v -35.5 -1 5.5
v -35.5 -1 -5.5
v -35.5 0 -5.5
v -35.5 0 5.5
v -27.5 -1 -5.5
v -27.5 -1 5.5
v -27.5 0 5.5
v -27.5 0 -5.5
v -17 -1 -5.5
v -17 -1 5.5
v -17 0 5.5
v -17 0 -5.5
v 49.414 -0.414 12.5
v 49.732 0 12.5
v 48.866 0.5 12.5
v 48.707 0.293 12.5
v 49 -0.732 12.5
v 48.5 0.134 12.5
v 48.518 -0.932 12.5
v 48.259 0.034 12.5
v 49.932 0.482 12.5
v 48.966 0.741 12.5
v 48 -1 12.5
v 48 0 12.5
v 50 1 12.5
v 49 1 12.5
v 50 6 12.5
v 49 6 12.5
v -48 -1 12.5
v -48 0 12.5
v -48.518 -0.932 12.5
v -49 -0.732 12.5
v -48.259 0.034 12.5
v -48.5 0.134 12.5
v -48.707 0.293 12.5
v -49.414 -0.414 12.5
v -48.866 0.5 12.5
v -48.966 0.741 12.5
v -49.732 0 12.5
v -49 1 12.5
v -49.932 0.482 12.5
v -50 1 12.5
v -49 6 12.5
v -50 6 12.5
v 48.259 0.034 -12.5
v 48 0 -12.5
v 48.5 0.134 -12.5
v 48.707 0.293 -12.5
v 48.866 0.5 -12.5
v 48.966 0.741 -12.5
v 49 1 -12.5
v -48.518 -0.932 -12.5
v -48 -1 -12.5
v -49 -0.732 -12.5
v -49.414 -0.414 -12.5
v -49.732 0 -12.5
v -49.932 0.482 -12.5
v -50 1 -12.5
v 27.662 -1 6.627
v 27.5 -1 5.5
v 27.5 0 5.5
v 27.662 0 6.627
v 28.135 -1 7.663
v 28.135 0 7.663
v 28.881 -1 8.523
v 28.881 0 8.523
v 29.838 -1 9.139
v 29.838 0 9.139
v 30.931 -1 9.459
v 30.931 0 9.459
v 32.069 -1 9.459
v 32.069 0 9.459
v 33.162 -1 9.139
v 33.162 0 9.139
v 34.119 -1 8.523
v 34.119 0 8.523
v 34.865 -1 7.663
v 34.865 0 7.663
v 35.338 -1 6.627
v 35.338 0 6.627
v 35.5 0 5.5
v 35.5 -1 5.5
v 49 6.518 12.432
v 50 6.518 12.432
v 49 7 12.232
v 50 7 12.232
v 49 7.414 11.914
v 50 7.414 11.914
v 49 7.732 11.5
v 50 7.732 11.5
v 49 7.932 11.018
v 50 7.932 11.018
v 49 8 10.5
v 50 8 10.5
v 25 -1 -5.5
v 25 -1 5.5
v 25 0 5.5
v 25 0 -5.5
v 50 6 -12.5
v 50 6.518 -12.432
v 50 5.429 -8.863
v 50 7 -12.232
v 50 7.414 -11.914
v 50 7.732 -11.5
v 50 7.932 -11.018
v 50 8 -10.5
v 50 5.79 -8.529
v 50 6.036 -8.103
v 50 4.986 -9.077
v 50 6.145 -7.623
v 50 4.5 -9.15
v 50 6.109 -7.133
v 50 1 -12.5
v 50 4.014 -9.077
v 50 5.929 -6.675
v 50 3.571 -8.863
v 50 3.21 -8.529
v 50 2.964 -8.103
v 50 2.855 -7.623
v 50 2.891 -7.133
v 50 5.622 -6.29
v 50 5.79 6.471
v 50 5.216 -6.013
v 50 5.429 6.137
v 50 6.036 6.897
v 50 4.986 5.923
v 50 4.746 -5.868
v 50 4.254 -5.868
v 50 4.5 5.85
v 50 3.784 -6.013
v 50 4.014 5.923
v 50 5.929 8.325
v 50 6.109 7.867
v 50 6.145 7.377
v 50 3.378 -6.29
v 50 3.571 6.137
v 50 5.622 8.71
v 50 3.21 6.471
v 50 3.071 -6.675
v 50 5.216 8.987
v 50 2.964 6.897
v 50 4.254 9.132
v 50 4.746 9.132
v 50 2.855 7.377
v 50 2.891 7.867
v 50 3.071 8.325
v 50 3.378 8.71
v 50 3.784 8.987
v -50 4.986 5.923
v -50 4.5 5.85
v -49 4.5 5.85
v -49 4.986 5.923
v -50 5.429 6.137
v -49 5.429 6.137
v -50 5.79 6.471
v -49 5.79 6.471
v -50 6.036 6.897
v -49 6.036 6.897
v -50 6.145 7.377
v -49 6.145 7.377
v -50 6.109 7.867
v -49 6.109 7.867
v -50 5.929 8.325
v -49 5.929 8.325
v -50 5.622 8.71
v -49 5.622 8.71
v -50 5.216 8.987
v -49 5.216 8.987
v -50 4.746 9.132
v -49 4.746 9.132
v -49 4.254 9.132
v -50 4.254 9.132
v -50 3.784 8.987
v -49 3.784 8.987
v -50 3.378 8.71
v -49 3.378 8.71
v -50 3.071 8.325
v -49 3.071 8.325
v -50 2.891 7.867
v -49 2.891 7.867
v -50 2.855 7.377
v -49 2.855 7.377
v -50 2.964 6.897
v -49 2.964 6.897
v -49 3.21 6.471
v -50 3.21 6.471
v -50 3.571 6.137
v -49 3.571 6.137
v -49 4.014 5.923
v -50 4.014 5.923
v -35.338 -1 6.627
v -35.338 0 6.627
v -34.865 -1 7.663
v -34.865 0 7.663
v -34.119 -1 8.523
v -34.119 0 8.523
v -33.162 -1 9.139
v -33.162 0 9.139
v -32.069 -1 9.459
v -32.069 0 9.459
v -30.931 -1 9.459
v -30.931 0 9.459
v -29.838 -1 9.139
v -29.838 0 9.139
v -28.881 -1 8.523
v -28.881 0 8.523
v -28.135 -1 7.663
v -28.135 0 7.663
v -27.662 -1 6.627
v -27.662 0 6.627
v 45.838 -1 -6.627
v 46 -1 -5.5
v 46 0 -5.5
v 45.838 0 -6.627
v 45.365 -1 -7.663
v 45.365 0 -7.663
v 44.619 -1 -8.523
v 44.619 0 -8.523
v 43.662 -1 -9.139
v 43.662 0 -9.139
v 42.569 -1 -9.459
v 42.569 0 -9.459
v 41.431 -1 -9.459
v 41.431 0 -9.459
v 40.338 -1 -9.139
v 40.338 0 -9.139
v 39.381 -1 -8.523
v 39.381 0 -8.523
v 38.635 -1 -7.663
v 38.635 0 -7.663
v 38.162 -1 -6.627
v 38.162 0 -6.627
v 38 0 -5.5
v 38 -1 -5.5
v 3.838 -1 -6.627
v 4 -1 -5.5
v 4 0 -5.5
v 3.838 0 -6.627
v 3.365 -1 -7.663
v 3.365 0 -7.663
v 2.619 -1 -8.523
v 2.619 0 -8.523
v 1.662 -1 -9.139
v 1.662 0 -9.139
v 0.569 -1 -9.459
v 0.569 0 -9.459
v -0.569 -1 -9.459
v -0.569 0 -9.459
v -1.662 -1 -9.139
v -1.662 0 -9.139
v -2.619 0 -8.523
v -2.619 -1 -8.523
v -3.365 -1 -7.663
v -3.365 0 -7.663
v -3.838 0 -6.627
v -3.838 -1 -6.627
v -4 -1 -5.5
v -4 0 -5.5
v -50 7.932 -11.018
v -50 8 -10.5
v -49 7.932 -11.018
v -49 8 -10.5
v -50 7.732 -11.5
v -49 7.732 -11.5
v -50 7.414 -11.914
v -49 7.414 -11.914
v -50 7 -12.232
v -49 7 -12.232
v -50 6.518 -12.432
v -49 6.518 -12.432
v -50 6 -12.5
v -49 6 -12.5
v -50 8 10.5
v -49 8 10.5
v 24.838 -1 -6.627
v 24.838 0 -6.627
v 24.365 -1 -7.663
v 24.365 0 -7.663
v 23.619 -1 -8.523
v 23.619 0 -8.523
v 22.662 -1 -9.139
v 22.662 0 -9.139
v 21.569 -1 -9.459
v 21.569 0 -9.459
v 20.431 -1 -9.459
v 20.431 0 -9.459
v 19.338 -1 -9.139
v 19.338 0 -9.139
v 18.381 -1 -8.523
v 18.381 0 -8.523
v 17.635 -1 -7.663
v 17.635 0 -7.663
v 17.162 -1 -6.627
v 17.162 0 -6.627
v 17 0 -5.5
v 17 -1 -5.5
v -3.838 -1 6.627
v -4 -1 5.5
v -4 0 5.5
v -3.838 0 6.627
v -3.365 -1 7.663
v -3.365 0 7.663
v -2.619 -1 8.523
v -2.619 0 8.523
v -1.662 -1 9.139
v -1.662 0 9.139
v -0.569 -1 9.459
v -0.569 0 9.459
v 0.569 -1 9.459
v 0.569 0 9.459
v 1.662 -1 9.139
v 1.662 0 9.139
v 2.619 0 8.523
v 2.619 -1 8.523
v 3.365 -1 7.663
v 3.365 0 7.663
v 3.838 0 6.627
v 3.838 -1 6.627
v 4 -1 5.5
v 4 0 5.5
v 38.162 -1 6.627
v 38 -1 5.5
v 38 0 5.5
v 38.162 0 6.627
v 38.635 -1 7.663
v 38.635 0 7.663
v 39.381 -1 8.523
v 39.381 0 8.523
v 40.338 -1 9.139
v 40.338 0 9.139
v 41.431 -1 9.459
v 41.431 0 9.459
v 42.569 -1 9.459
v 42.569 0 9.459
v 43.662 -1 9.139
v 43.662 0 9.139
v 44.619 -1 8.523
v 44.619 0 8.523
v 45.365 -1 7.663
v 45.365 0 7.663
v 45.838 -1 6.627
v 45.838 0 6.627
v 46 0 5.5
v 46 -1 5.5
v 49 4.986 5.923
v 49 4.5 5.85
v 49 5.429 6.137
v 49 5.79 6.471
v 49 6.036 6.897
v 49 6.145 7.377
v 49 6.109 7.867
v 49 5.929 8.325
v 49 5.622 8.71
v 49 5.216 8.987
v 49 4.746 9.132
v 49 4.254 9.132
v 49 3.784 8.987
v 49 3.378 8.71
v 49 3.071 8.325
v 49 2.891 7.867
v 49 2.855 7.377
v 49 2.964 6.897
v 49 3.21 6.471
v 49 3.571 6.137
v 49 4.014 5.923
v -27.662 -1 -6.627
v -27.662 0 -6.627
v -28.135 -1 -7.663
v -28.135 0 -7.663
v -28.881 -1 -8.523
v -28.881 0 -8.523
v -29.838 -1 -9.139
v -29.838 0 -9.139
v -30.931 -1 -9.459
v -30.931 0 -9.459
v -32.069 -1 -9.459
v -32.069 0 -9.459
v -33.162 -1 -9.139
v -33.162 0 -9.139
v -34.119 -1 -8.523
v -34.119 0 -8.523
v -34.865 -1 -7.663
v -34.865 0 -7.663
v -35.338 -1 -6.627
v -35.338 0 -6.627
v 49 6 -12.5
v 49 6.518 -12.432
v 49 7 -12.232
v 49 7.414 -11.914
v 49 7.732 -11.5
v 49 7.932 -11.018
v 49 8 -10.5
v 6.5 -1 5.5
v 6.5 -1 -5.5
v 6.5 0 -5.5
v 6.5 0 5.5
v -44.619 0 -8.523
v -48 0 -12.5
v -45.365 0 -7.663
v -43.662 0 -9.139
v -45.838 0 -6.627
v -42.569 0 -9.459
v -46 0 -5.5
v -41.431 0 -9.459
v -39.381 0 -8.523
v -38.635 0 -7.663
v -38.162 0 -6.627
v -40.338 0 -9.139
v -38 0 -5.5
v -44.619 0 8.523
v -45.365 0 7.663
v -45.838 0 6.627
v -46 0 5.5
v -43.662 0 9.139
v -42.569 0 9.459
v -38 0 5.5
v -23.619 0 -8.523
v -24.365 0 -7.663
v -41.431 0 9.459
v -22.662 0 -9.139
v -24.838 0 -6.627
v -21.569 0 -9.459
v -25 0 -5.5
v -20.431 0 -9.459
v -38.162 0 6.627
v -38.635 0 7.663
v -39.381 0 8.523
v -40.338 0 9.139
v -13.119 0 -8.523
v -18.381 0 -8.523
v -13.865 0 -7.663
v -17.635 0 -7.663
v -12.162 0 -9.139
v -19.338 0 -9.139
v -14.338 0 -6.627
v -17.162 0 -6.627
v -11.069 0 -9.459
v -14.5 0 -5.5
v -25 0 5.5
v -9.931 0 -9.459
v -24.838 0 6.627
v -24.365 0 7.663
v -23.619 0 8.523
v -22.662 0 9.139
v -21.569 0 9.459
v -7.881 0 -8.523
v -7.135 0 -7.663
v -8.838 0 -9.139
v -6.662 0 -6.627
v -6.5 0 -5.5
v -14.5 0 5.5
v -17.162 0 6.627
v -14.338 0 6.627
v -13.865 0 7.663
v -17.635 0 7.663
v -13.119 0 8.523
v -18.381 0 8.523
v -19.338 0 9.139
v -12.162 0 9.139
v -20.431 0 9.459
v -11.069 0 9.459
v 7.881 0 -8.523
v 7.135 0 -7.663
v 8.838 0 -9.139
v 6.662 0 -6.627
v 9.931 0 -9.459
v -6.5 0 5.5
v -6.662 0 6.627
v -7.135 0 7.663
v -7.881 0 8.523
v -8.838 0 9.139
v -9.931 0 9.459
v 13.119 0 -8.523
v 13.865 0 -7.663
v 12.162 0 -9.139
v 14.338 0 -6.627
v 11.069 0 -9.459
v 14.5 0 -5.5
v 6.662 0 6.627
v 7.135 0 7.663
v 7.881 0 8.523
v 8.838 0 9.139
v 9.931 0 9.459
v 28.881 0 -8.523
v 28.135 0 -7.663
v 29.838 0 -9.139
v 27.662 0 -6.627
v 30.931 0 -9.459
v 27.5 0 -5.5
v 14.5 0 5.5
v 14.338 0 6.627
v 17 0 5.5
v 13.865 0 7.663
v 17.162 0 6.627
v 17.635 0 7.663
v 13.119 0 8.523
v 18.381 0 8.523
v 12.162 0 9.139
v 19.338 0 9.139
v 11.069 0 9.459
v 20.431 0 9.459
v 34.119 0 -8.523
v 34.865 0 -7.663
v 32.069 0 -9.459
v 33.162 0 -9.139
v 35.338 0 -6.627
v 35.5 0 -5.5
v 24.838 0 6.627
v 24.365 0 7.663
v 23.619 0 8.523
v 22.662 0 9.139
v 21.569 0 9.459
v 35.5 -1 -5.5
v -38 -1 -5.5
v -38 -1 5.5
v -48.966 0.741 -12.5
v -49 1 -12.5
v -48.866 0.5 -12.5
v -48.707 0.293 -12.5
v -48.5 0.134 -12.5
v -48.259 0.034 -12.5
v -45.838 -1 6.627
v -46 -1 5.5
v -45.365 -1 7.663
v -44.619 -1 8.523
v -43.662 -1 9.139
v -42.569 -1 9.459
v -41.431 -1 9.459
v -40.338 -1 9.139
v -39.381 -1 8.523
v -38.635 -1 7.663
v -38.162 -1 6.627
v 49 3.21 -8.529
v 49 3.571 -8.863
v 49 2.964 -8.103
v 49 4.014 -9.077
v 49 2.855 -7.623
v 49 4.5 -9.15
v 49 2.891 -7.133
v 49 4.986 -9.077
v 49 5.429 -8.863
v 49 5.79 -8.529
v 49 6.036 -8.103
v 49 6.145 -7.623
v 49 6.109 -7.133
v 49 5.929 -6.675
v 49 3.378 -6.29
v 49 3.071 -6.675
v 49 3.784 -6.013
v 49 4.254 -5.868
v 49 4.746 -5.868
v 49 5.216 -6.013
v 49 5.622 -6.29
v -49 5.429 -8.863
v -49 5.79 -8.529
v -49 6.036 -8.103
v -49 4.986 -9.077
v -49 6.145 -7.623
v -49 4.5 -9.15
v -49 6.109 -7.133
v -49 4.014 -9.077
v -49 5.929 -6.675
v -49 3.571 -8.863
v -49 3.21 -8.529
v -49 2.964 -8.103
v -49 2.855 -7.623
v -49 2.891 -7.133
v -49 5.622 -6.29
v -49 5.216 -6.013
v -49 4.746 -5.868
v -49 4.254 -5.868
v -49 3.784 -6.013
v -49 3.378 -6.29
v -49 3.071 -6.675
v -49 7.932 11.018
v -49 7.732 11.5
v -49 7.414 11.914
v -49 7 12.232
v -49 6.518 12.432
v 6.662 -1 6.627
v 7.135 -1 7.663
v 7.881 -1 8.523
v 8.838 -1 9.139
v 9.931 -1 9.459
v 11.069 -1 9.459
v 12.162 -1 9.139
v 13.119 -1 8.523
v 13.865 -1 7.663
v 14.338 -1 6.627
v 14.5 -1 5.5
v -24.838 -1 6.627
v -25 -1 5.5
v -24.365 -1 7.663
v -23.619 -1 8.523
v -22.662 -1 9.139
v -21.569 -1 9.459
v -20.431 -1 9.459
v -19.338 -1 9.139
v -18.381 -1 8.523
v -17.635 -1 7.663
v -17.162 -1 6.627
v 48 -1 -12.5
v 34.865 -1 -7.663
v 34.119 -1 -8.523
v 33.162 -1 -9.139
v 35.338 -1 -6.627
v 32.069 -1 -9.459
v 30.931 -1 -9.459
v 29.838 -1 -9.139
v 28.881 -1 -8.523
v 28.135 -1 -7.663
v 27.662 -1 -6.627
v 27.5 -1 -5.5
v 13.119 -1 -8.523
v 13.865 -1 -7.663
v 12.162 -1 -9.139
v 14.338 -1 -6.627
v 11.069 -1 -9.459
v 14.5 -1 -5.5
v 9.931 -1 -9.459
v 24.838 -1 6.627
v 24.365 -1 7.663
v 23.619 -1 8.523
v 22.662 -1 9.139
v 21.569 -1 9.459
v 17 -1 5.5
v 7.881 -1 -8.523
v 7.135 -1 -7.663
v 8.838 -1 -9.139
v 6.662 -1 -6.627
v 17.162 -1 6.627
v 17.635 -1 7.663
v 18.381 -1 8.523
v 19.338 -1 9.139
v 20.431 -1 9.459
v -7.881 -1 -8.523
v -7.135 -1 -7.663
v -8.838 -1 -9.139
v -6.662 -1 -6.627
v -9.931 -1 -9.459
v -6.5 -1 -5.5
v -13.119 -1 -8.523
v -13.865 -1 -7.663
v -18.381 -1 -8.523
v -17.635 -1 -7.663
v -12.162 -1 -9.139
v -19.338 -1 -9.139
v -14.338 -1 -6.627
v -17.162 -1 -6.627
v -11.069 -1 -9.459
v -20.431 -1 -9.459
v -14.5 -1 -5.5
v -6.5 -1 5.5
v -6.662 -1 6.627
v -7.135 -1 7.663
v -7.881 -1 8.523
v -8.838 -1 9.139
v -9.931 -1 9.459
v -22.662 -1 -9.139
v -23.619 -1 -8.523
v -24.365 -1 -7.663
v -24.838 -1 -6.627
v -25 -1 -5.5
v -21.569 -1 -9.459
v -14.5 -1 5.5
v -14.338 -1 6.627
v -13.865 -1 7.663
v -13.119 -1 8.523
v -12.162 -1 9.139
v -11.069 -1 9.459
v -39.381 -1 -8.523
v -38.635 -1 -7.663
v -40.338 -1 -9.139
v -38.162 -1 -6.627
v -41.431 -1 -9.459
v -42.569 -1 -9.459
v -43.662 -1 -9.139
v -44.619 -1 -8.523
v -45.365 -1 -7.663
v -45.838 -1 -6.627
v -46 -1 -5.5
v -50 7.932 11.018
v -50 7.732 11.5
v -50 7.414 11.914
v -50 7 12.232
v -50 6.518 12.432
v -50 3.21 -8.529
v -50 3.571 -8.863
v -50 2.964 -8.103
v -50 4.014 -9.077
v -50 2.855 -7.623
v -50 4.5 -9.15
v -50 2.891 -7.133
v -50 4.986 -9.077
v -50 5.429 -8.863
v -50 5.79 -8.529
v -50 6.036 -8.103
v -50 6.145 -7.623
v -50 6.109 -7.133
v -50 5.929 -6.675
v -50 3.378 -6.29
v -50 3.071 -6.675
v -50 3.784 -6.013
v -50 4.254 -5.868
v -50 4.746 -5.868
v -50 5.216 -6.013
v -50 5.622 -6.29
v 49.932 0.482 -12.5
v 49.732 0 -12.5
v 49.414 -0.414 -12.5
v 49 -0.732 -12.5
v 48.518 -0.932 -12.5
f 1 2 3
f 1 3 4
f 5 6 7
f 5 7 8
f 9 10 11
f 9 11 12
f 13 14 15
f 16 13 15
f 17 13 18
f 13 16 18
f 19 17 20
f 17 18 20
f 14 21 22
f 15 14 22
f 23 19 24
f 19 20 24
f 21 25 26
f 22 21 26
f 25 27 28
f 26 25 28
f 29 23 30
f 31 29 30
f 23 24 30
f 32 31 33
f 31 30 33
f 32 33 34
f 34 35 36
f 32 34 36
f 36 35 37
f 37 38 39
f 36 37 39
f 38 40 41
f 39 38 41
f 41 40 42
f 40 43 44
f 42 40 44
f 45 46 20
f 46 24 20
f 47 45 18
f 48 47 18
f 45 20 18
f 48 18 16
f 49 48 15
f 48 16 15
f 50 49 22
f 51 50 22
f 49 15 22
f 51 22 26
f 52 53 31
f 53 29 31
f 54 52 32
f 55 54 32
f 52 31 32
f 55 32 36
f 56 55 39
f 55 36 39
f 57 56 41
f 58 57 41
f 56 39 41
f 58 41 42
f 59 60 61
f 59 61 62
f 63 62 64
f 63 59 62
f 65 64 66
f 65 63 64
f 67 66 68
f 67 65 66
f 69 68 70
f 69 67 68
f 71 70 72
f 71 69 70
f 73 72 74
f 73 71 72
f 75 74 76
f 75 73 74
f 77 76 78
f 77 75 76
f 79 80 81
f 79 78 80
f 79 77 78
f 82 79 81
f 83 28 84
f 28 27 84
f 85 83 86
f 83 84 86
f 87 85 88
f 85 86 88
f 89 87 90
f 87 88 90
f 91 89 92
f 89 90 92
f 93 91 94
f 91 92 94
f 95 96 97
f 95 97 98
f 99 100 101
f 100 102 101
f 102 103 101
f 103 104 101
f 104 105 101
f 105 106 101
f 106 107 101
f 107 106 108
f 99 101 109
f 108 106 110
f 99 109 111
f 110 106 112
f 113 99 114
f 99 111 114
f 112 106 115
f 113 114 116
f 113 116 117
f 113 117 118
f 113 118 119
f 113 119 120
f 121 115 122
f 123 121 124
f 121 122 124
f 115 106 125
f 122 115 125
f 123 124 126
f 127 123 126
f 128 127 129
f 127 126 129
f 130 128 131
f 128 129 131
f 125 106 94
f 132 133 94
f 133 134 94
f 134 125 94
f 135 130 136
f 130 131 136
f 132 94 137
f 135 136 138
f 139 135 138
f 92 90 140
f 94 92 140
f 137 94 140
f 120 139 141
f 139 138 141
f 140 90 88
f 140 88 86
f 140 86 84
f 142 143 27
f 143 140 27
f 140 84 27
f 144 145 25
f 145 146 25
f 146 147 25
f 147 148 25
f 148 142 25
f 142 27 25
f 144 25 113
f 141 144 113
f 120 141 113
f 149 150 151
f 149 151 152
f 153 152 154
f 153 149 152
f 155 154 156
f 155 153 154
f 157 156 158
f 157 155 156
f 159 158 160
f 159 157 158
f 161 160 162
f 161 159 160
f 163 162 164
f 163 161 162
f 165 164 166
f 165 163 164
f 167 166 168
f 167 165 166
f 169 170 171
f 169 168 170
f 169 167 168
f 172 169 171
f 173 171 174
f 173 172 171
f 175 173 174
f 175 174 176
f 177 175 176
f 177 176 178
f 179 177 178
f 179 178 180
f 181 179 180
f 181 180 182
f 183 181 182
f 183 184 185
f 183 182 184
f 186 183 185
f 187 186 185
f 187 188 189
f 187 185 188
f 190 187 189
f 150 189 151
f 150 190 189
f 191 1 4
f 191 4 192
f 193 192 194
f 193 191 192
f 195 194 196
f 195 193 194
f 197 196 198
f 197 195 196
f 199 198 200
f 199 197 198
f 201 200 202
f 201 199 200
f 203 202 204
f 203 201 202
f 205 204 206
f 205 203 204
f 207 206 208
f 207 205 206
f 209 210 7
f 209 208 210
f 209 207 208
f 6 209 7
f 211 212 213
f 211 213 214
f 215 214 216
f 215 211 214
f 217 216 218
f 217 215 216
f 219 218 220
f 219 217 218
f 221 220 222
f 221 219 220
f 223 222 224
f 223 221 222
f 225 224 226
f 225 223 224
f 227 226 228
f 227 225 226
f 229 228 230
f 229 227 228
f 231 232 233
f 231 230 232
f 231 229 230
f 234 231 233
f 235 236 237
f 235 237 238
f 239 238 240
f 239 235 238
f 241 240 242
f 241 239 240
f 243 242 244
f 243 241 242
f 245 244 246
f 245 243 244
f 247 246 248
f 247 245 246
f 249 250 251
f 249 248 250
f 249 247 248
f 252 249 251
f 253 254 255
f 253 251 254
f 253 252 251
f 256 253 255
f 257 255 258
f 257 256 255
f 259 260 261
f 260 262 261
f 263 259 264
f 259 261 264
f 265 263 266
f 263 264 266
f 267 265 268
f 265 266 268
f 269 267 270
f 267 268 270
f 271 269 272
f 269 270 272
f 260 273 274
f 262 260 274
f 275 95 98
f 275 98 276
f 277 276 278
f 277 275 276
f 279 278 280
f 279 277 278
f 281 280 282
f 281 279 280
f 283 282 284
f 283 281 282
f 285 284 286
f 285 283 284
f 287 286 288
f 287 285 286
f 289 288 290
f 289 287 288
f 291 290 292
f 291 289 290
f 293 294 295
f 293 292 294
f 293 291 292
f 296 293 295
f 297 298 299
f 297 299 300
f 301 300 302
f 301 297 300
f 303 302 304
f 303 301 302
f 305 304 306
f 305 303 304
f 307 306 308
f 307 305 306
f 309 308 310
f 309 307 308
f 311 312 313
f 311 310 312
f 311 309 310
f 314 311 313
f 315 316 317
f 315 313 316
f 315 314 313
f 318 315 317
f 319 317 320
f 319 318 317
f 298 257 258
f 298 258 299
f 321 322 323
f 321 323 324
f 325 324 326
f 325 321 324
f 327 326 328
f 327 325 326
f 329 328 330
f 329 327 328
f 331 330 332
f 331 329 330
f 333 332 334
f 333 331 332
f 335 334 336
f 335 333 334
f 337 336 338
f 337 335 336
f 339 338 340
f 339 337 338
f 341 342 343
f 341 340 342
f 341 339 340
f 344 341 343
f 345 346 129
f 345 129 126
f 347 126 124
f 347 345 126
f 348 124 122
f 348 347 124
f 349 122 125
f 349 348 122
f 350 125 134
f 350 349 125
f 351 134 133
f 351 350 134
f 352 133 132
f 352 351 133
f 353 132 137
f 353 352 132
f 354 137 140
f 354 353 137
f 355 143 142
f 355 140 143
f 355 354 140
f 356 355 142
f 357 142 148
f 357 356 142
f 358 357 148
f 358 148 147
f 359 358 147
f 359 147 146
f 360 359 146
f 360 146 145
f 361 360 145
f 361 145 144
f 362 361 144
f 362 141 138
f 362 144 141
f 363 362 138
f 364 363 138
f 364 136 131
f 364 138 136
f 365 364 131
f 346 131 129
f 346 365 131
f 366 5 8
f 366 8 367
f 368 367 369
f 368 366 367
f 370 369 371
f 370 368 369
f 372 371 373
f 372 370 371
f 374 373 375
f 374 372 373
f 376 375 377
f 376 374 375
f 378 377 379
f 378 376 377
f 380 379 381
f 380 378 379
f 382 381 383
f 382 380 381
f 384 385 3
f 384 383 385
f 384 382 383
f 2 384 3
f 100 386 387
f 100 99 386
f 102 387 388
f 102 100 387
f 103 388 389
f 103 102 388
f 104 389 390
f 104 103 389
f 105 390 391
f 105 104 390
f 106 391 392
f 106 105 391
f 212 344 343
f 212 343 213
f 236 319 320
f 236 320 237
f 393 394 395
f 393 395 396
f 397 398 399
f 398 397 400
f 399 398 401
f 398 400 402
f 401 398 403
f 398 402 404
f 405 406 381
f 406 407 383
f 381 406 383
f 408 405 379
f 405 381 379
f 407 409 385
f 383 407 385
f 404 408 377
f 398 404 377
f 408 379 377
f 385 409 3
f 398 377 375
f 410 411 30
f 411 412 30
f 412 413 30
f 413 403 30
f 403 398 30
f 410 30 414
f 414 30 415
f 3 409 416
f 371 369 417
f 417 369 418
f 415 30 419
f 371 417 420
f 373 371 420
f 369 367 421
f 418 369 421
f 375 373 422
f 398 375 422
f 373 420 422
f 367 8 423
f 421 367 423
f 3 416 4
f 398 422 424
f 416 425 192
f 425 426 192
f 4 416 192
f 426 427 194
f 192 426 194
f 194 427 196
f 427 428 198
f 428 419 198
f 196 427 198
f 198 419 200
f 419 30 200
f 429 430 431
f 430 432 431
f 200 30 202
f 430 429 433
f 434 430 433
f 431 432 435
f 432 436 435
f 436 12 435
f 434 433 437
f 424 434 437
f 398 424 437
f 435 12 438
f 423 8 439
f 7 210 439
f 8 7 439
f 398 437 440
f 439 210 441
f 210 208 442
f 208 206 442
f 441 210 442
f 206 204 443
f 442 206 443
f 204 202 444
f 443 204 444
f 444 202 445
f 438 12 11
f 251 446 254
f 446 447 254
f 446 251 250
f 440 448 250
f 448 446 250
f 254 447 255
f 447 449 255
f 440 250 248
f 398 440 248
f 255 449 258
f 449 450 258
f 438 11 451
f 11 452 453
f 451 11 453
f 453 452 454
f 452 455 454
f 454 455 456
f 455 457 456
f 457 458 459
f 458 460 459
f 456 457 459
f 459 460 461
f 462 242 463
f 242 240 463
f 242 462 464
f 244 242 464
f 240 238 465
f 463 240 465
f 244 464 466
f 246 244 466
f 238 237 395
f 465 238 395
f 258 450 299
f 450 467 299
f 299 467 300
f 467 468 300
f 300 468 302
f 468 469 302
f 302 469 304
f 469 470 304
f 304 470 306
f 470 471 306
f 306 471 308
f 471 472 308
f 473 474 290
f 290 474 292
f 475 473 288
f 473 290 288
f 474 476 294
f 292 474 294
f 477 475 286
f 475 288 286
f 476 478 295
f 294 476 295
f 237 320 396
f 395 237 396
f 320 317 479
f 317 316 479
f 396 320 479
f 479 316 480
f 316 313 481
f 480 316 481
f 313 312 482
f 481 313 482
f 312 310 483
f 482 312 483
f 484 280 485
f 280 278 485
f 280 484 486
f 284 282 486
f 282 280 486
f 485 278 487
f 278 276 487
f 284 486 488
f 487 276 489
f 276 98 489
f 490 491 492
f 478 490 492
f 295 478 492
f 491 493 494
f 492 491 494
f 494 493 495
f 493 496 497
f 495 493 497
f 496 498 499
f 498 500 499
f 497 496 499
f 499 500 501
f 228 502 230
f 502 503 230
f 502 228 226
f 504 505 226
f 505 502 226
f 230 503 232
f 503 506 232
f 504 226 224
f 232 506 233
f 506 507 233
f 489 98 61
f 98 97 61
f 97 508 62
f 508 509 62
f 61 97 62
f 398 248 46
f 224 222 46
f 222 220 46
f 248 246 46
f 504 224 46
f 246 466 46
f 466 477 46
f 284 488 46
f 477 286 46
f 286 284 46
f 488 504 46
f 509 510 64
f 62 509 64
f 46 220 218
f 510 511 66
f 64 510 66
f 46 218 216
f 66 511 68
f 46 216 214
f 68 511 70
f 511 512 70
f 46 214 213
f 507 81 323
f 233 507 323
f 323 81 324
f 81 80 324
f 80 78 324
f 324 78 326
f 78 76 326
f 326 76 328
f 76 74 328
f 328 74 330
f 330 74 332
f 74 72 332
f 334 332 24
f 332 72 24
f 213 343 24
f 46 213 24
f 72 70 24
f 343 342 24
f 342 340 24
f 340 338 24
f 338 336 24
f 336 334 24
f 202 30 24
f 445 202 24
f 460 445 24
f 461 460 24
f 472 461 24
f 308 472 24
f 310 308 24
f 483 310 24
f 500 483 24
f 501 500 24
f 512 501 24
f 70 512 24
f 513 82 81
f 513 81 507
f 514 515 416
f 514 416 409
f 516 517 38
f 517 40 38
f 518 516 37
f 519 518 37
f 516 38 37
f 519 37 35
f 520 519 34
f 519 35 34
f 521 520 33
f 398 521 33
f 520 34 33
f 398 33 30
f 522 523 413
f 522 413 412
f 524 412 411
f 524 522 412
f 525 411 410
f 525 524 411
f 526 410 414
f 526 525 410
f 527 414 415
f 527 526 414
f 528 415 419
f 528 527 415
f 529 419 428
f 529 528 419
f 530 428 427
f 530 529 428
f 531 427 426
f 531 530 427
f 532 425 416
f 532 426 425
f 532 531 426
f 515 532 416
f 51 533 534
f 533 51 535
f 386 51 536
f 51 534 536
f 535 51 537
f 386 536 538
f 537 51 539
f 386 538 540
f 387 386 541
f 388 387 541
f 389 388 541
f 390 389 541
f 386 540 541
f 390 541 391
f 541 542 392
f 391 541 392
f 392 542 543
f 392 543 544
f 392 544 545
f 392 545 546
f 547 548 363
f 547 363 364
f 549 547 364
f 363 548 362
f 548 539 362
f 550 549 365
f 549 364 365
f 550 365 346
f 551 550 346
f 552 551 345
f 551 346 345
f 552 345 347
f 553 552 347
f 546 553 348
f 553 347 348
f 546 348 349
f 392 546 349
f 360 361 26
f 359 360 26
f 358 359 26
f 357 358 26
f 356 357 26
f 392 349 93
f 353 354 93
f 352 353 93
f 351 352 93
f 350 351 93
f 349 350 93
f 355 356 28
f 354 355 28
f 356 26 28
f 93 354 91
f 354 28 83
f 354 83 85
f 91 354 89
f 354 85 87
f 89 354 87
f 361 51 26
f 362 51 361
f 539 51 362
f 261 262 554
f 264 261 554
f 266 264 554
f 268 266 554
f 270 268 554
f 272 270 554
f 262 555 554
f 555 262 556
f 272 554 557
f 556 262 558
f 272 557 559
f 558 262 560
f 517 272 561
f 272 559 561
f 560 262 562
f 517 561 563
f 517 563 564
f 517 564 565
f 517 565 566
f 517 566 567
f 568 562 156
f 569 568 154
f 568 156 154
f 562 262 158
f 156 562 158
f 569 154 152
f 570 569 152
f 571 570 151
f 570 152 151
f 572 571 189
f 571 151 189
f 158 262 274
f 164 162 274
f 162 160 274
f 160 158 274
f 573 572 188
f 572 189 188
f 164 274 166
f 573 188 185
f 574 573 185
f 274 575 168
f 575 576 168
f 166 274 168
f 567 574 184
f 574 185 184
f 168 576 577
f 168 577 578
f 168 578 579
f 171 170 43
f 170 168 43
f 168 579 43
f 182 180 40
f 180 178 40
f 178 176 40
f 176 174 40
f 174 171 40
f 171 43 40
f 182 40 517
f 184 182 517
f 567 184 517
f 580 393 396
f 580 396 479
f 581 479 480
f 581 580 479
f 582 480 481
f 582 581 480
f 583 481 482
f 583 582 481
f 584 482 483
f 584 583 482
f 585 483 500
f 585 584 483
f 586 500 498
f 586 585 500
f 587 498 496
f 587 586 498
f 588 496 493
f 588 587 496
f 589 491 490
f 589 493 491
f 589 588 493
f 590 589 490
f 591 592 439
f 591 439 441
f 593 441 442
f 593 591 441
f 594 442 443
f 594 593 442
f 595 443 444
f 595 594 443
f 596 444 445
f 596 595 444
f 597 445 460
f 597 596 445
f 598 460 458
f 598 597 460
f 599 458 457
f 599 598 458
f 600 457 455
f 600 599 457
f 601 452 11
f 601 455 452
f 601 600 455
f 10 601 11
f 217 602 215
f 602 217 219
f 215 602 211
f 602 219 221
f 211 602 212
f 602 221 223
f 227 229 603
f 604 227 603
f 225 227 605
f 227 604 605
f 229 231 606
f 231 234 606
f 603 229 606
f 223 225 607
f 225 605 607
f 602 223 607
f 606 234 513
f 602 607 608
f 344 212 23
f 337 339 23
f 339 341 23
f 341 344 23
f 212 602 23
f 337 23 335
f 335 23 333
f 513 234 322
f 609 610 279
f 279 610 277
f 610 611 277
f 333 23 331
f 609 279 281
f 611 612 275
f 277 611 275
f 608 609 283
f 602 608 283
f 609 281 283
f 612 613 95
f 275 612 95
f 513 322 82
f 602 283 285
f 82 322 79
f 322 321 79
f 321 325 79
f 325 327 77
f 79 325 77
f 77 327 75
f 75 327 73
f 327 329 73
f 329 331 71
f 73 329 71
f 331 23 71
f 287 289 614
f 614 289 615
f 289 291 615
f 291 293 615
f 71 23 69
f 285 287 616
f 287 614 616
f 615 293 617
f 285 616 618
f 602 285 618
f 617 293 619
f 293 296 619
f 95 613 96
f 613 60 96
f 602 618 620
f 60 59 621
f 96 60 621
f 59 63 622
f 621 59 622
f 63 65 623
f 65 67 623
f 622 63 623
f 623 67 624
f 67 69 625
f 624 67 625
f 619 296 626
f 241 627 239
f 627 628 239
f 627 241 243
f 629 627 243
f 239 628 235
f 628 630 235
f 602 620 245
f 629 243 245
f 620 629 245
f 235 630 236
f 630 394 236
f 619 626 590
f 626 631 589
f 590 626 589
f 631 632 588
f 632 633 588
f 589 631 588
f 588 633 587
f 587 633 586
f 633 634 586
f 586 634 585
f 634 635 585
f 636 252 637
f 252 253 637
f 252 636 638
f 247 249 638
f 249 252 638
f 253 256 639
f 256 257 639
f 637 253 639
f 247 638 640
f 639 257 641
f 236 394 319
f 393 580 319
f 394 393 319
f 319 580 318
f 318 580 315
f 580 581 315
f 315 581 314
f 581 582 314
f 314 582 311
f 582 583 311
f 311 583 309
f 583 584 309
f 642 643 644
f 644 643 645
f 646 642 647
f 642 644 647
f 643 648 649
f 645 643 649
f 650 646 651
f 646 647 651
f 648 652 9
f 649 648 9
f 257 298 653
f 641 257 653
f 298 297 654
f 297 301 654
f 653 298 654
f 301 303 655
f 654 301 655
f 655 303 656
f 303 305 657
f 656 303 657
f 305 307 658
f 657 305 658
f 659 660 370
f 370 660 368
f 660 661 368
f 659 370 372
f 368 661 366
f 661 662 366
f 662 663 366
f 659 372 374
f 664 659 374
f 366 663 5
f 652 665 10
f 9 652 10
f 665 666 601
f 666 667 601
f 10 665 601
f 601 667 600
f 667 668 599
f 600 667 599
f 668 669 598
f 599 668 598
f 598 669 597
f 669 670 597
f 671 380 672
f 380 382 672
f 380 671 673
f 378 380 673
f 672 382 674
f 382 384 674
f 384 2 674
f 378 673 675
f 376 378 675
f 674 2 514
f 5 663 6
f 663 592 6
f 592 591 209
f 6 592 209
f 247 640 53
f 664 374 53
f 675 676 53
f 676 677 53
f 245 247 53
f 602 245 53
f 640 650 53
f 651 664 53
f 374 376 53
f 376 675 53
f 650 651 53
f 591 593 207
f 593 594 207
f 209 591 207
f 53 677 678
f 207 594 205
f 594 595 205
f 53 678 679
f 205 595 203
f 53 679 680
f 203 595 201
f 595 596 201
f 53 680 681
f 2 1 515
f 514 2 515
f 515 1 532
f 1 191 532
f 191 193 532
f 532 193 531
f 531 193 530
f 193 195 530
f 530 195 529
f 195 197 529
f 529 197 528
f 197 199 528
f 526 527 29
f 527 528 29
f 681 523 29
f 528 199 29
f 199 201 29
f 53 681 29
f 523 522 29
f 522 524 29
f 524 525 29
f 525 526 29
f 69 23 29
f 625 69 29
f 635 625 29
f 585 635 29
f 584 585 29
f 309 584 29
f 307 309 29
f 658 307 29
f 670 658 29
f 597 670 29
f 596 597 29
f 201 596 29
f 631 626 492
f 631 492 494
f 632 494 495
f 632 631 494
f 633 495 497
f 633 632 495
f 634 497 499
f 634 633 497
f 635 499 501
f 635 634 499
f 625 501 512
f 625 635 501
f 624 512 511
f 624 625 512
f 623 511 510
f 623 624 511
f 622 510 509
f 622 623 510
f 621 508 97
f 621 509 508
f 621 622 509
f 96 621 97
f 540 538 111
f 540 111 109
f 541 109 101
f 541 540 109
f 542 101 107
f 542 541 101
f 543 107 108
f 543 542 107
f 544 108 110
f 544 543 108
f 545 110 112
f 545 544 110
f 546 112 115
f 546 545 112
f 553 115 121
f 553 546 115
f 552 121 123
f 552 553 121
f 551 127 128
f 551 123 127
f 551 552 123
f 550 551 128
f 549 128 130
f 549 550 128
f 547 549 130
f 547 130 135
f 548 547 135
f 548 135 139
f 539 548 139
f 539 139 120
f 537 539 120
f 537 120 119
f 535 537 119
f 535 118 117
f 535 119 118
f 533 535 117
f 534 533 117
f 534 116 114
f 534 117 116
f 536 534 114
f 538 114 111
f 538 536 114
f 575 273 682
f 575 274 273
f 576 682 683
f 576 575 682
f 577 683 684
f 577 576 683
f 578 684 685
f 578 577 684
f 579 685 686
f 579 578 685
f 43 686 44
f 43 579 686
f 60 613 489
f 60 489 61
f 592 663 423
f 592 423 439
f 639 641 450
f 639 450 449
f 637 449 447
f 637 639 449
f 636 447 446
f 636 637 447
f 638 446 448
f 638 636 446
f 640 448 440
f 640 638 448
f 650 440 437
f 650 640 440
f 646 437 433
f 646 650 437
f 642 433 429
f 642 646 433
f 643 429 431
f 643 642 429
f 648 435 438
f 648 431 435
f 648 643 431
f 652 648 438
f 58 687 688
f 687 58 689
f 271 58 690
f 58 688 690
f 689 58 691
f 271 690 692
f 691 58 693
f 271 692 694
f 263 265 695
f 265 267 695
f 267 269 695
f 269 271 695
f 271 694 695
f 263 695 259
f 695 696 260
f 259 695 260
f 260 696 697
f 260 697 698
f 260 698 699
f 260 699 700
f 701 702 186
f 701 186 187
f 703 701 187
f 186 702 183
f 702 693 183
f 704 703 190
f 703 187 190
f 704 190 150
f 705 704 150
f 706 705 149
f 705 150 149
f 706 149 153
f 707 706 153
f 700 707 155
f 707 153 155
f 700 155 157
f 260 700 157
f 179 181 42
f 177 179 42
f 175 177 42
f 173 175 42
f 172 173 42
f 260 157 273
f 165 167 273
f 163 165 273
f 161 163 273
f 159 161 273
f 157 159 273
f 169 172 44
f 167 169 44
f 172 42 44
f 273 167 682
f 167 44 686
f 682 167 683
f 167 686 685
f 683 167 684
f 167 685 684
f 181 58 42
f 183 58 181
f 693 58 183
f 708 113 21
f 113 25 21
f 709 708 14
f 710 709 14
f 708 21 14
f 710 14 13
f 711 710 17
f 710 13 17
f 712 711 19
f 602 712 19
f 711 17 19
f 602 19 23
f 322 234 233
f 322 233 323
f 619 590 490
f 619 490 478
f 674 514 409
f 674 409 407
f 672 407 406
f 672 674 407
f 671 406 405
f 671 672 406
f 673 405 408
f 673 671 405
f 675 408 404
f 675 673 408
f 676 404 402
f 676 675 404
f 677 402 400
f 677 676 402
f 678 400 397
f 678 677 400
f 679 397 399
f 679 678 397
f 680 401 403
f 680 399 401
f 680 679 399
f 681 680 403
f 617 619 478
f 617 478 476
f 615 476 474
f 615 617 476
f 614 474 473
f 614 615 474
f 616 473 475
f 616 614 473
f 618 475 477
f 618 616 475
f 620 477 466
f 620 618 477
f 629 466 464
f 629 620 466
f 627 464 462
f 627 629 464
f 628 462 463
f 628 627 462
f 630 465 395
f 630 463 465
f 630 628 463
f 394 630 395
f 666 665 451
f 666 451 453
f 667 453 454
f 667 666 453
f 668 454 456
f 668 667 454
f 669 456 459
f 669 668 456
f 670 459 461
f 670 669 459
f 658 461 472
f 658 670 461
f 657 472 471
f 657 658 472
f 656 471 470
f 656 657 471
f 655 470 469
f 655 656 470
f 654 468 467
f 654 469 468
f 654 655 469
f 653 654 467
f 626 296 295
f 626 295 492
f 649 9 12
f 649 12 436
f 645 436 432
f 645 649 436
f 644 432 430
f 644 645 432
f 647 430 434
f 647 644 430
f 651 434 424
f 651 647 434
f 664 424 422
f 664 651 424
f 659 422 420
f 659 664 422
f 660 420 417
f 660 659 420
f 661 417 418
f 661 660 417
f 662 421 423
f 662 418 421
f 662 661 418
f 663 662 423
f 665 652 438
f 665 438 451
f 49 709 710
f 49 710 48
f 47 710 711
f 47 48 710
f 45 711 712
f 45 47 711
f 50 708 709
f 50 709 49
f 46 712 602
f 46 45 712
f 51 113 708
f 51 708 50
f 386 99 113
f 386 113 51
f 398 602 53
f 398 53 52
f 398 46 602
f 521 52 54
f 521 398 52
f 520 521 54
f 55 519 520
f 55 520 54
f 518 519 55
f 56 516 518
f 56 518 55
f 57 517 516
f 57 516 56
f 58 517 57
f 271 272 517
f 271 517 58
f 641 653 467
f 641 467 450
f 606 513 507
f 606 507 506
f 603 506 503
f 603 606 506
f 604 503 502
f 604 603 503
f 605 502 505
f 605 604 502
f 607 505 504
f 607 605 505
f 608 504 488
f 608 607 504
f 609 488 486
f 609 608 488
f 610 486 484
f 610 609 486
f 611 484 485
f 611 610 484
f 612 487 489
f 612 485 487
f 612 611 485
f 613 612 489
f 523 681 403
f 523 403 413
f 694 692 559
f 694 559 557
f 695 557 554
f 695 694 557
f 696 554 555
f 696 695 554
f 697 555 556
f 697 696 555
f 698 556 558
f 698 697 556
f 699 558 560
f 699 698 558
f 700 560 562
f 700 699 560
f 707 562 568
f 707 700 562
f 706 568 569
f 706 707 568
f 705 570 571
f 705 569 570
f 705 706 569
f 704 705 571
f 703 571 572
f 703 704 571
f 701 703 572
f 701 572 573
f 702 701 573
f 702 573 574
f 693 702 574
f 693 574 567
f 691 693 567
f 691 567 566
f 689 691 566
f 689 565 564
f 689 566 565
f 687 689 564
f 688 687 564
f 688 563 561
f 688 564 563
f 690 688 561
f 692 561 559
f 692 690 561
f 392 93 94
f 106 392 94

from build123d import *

# Parameters (mm, degrees)
SM_BASE_FLANGE_1_DEPTH   = 12.5
CUT_EXTRUDE_1_DEPTH      = 53.156015952
CUT_EXTRUDE_1_DEPTH_BACK = 53.156015952
SKETCH_6_R               = 1.65
CUT_EXTRUDE_2_DEPTH      = 10
FILLET_1_R               = 2


# Sheet-metal steps are written as plain solids
with BuildPart() as part:
    # Sketch 1 → 基体-法兰1 (new, symmetric)
    with BuildSketch(Plane.XY):
        with BuildLine():
            Line((-49, 8), (-49, 1))
            ThreePointArc((-49, 1), (-48.707106781, 0.292893219), (-48, 0))
            Line((-48, 0), (48, 0))
            ThreePointArc((48, 0), (48.707106781, 0.292893219), (49, 1))
            Line((49, 1), (49, 8))
            Line((49, 8), (50, 8))
            Line((50, 8), (50, 1))
            ThreePointArc((50, 1), (49.414213562, -0.414213562), (48, -1))
            Line((48, -1), (-48, -1))
            ThreePointArc((-48, -1), (-49.414213562, -0.414213562), (-50, 1))
            Line((-50, 1), (-50, 8))
            Line((-50, 8), (-49, 8))
        make_face()
    extrude(amount=SM_BASE_FLANGE_1_DEPTH, both=True)

    # 草图6 → 切除-拉伸1 (cut, two sides: drawn at the far end of the back side and taken through both)
    with BuildSketch(Plane(origin=(0, 0, 0), x_dir=(0, 0, -1), z_dir=(1, 0, 0)).offset(-CUT_EXTRUDE_1_DEPTH_BACK)):
        with Locations((-7.5, 4.5)):
            Circle(SKETCH_6_R)
        with Locations((7.5, 4.5)):
            Circle(SKETCH_6_R)
    extrude(amount=CUT_EXTRUDE_1_DEPTH + CUT_EXTRUDE_1_DEPTH_BACK, mode=Mode.SUBTRACT)

    # 草图7 → 切除-拉伸2 (cut)
    with BuildSketch(Plane.XZ.offset(1)):
        with BuildLine():
            Line((46, 5.5), (46, -5.5))
            ThreePointArc((46, -5.5), (42, -9.5), (38, -5.5))
            Line((38, -5.5), (38, 5.5))
            ThreePointArc((38, 5.5), (42, 9.5), (46, 5.5))
        make_face()
        with BuildLine():
            Line((-38, 5.5), (-38, -5.5))
            ThreePointArc((-38, -5.5), (-42, -9.5), (-46, -5.5))
            Line((-46, -5.5), (-46, 5.5))
            ThreePointArc((-46, 5.5), (-42, 9.5), (-38, 5.5))
        make_face()
        with BuildLine():
            Line((-27.5, 5.5), (-27.5, -5.5))
            ThreePointArc((-27.5, -5.5), (-31.5, -9.5), (-35.5, -5.5))
            Line((-35.5, -5.5), (-35.5, 5.5))
            ThreePointArc((-35.5, 5.5), (-31.5, 9.5), (-27.5, 5.5))
        make_face()
        with BuildLine():
            Line((-17, 5.5), (-17, -5.5))
            ThreePointArc((-17, -5.5), (-21, -9.5), (-25, -5.5))
            Line((-25, -5.5), (-25, 5.5))
            ThreePointArc((-25, 5.5), (-21, 9.5), (-17, 5.5))
        make_face()
        with BuildLine():
            Line((-6.5, 5.5), (-6.5, -5.5))
            ThreePointArc((-6.5, -5.5), (-10.5, -9.5), (-14.5, -5.5))
            Line((-14.5, -5.5), (-14.5, 5.5))
            ThreePointArc((-14.5, 5.5), (-10.5, 9.5), (-6.5, 5.5))
        make_face()
        with BuildLine():
            Line((4, 5.5), (4, -5.5))
            ThreePointArc((4, -5.5), (0, -9.5), (-4, -5.5))
            Line((-4, -5.5), (-4, 5.5))
            ThreePointArc((-4, 5.5), (0, 9.5), (4, 5.5))
        make_face()
        with BuildLine():
            Line((14.5, 5.5), (14.5, -5.5))
            ThreePointArc((14.5, -5.5), (10.5, -9.5), (6.5, -5.5))
            Line((6.5, -5.5), (6.5, 5.5))
            ThreePointArc((6.5, 5.5), (10.5, 9.5), (14.5, 5.5))
        make_face()
        with BuildLine():
            Line((25, 5.5), (25, -5.5))
            ThreePointArc((25, -5.5), (21, -9.5), (17, -5.5))
            Line((17, -5.5), (17, 5.5))
            ThreePointArc((17, 5.5), (21, 9.5), (25, 5.5))
        make_face()
        with BuildLine():
            Line((35.5, 5.5), (35.5, -5.5))
            ThreePointArc((35.5, -5.5), (31.5, -9.5), (27.5, -5.5))
            Line((27.5, -5.5), (27.5, 5.5))
            ThreePointArc((27.5, 5.5), (31.5, 9.5), (35.5, 5.5))
        make_face()
    extrude(amount=-CUT_EXTRUDE_2_DEPTH, mode=Mode.SUBTRACT)

    # 圆角1
    fillet_1_edges = [part.edges().sort_by_distance(p)[0] for p in [
        (-49.5, 8, -12.5),
        (49.5, 8, -12.5),
        (-49.5, 8, 12.5),
        (49.5, 8, 12.5),
    ]]
    fillet(fillet_1_edges, radius=FILLET_1_R)


solid = part.part
